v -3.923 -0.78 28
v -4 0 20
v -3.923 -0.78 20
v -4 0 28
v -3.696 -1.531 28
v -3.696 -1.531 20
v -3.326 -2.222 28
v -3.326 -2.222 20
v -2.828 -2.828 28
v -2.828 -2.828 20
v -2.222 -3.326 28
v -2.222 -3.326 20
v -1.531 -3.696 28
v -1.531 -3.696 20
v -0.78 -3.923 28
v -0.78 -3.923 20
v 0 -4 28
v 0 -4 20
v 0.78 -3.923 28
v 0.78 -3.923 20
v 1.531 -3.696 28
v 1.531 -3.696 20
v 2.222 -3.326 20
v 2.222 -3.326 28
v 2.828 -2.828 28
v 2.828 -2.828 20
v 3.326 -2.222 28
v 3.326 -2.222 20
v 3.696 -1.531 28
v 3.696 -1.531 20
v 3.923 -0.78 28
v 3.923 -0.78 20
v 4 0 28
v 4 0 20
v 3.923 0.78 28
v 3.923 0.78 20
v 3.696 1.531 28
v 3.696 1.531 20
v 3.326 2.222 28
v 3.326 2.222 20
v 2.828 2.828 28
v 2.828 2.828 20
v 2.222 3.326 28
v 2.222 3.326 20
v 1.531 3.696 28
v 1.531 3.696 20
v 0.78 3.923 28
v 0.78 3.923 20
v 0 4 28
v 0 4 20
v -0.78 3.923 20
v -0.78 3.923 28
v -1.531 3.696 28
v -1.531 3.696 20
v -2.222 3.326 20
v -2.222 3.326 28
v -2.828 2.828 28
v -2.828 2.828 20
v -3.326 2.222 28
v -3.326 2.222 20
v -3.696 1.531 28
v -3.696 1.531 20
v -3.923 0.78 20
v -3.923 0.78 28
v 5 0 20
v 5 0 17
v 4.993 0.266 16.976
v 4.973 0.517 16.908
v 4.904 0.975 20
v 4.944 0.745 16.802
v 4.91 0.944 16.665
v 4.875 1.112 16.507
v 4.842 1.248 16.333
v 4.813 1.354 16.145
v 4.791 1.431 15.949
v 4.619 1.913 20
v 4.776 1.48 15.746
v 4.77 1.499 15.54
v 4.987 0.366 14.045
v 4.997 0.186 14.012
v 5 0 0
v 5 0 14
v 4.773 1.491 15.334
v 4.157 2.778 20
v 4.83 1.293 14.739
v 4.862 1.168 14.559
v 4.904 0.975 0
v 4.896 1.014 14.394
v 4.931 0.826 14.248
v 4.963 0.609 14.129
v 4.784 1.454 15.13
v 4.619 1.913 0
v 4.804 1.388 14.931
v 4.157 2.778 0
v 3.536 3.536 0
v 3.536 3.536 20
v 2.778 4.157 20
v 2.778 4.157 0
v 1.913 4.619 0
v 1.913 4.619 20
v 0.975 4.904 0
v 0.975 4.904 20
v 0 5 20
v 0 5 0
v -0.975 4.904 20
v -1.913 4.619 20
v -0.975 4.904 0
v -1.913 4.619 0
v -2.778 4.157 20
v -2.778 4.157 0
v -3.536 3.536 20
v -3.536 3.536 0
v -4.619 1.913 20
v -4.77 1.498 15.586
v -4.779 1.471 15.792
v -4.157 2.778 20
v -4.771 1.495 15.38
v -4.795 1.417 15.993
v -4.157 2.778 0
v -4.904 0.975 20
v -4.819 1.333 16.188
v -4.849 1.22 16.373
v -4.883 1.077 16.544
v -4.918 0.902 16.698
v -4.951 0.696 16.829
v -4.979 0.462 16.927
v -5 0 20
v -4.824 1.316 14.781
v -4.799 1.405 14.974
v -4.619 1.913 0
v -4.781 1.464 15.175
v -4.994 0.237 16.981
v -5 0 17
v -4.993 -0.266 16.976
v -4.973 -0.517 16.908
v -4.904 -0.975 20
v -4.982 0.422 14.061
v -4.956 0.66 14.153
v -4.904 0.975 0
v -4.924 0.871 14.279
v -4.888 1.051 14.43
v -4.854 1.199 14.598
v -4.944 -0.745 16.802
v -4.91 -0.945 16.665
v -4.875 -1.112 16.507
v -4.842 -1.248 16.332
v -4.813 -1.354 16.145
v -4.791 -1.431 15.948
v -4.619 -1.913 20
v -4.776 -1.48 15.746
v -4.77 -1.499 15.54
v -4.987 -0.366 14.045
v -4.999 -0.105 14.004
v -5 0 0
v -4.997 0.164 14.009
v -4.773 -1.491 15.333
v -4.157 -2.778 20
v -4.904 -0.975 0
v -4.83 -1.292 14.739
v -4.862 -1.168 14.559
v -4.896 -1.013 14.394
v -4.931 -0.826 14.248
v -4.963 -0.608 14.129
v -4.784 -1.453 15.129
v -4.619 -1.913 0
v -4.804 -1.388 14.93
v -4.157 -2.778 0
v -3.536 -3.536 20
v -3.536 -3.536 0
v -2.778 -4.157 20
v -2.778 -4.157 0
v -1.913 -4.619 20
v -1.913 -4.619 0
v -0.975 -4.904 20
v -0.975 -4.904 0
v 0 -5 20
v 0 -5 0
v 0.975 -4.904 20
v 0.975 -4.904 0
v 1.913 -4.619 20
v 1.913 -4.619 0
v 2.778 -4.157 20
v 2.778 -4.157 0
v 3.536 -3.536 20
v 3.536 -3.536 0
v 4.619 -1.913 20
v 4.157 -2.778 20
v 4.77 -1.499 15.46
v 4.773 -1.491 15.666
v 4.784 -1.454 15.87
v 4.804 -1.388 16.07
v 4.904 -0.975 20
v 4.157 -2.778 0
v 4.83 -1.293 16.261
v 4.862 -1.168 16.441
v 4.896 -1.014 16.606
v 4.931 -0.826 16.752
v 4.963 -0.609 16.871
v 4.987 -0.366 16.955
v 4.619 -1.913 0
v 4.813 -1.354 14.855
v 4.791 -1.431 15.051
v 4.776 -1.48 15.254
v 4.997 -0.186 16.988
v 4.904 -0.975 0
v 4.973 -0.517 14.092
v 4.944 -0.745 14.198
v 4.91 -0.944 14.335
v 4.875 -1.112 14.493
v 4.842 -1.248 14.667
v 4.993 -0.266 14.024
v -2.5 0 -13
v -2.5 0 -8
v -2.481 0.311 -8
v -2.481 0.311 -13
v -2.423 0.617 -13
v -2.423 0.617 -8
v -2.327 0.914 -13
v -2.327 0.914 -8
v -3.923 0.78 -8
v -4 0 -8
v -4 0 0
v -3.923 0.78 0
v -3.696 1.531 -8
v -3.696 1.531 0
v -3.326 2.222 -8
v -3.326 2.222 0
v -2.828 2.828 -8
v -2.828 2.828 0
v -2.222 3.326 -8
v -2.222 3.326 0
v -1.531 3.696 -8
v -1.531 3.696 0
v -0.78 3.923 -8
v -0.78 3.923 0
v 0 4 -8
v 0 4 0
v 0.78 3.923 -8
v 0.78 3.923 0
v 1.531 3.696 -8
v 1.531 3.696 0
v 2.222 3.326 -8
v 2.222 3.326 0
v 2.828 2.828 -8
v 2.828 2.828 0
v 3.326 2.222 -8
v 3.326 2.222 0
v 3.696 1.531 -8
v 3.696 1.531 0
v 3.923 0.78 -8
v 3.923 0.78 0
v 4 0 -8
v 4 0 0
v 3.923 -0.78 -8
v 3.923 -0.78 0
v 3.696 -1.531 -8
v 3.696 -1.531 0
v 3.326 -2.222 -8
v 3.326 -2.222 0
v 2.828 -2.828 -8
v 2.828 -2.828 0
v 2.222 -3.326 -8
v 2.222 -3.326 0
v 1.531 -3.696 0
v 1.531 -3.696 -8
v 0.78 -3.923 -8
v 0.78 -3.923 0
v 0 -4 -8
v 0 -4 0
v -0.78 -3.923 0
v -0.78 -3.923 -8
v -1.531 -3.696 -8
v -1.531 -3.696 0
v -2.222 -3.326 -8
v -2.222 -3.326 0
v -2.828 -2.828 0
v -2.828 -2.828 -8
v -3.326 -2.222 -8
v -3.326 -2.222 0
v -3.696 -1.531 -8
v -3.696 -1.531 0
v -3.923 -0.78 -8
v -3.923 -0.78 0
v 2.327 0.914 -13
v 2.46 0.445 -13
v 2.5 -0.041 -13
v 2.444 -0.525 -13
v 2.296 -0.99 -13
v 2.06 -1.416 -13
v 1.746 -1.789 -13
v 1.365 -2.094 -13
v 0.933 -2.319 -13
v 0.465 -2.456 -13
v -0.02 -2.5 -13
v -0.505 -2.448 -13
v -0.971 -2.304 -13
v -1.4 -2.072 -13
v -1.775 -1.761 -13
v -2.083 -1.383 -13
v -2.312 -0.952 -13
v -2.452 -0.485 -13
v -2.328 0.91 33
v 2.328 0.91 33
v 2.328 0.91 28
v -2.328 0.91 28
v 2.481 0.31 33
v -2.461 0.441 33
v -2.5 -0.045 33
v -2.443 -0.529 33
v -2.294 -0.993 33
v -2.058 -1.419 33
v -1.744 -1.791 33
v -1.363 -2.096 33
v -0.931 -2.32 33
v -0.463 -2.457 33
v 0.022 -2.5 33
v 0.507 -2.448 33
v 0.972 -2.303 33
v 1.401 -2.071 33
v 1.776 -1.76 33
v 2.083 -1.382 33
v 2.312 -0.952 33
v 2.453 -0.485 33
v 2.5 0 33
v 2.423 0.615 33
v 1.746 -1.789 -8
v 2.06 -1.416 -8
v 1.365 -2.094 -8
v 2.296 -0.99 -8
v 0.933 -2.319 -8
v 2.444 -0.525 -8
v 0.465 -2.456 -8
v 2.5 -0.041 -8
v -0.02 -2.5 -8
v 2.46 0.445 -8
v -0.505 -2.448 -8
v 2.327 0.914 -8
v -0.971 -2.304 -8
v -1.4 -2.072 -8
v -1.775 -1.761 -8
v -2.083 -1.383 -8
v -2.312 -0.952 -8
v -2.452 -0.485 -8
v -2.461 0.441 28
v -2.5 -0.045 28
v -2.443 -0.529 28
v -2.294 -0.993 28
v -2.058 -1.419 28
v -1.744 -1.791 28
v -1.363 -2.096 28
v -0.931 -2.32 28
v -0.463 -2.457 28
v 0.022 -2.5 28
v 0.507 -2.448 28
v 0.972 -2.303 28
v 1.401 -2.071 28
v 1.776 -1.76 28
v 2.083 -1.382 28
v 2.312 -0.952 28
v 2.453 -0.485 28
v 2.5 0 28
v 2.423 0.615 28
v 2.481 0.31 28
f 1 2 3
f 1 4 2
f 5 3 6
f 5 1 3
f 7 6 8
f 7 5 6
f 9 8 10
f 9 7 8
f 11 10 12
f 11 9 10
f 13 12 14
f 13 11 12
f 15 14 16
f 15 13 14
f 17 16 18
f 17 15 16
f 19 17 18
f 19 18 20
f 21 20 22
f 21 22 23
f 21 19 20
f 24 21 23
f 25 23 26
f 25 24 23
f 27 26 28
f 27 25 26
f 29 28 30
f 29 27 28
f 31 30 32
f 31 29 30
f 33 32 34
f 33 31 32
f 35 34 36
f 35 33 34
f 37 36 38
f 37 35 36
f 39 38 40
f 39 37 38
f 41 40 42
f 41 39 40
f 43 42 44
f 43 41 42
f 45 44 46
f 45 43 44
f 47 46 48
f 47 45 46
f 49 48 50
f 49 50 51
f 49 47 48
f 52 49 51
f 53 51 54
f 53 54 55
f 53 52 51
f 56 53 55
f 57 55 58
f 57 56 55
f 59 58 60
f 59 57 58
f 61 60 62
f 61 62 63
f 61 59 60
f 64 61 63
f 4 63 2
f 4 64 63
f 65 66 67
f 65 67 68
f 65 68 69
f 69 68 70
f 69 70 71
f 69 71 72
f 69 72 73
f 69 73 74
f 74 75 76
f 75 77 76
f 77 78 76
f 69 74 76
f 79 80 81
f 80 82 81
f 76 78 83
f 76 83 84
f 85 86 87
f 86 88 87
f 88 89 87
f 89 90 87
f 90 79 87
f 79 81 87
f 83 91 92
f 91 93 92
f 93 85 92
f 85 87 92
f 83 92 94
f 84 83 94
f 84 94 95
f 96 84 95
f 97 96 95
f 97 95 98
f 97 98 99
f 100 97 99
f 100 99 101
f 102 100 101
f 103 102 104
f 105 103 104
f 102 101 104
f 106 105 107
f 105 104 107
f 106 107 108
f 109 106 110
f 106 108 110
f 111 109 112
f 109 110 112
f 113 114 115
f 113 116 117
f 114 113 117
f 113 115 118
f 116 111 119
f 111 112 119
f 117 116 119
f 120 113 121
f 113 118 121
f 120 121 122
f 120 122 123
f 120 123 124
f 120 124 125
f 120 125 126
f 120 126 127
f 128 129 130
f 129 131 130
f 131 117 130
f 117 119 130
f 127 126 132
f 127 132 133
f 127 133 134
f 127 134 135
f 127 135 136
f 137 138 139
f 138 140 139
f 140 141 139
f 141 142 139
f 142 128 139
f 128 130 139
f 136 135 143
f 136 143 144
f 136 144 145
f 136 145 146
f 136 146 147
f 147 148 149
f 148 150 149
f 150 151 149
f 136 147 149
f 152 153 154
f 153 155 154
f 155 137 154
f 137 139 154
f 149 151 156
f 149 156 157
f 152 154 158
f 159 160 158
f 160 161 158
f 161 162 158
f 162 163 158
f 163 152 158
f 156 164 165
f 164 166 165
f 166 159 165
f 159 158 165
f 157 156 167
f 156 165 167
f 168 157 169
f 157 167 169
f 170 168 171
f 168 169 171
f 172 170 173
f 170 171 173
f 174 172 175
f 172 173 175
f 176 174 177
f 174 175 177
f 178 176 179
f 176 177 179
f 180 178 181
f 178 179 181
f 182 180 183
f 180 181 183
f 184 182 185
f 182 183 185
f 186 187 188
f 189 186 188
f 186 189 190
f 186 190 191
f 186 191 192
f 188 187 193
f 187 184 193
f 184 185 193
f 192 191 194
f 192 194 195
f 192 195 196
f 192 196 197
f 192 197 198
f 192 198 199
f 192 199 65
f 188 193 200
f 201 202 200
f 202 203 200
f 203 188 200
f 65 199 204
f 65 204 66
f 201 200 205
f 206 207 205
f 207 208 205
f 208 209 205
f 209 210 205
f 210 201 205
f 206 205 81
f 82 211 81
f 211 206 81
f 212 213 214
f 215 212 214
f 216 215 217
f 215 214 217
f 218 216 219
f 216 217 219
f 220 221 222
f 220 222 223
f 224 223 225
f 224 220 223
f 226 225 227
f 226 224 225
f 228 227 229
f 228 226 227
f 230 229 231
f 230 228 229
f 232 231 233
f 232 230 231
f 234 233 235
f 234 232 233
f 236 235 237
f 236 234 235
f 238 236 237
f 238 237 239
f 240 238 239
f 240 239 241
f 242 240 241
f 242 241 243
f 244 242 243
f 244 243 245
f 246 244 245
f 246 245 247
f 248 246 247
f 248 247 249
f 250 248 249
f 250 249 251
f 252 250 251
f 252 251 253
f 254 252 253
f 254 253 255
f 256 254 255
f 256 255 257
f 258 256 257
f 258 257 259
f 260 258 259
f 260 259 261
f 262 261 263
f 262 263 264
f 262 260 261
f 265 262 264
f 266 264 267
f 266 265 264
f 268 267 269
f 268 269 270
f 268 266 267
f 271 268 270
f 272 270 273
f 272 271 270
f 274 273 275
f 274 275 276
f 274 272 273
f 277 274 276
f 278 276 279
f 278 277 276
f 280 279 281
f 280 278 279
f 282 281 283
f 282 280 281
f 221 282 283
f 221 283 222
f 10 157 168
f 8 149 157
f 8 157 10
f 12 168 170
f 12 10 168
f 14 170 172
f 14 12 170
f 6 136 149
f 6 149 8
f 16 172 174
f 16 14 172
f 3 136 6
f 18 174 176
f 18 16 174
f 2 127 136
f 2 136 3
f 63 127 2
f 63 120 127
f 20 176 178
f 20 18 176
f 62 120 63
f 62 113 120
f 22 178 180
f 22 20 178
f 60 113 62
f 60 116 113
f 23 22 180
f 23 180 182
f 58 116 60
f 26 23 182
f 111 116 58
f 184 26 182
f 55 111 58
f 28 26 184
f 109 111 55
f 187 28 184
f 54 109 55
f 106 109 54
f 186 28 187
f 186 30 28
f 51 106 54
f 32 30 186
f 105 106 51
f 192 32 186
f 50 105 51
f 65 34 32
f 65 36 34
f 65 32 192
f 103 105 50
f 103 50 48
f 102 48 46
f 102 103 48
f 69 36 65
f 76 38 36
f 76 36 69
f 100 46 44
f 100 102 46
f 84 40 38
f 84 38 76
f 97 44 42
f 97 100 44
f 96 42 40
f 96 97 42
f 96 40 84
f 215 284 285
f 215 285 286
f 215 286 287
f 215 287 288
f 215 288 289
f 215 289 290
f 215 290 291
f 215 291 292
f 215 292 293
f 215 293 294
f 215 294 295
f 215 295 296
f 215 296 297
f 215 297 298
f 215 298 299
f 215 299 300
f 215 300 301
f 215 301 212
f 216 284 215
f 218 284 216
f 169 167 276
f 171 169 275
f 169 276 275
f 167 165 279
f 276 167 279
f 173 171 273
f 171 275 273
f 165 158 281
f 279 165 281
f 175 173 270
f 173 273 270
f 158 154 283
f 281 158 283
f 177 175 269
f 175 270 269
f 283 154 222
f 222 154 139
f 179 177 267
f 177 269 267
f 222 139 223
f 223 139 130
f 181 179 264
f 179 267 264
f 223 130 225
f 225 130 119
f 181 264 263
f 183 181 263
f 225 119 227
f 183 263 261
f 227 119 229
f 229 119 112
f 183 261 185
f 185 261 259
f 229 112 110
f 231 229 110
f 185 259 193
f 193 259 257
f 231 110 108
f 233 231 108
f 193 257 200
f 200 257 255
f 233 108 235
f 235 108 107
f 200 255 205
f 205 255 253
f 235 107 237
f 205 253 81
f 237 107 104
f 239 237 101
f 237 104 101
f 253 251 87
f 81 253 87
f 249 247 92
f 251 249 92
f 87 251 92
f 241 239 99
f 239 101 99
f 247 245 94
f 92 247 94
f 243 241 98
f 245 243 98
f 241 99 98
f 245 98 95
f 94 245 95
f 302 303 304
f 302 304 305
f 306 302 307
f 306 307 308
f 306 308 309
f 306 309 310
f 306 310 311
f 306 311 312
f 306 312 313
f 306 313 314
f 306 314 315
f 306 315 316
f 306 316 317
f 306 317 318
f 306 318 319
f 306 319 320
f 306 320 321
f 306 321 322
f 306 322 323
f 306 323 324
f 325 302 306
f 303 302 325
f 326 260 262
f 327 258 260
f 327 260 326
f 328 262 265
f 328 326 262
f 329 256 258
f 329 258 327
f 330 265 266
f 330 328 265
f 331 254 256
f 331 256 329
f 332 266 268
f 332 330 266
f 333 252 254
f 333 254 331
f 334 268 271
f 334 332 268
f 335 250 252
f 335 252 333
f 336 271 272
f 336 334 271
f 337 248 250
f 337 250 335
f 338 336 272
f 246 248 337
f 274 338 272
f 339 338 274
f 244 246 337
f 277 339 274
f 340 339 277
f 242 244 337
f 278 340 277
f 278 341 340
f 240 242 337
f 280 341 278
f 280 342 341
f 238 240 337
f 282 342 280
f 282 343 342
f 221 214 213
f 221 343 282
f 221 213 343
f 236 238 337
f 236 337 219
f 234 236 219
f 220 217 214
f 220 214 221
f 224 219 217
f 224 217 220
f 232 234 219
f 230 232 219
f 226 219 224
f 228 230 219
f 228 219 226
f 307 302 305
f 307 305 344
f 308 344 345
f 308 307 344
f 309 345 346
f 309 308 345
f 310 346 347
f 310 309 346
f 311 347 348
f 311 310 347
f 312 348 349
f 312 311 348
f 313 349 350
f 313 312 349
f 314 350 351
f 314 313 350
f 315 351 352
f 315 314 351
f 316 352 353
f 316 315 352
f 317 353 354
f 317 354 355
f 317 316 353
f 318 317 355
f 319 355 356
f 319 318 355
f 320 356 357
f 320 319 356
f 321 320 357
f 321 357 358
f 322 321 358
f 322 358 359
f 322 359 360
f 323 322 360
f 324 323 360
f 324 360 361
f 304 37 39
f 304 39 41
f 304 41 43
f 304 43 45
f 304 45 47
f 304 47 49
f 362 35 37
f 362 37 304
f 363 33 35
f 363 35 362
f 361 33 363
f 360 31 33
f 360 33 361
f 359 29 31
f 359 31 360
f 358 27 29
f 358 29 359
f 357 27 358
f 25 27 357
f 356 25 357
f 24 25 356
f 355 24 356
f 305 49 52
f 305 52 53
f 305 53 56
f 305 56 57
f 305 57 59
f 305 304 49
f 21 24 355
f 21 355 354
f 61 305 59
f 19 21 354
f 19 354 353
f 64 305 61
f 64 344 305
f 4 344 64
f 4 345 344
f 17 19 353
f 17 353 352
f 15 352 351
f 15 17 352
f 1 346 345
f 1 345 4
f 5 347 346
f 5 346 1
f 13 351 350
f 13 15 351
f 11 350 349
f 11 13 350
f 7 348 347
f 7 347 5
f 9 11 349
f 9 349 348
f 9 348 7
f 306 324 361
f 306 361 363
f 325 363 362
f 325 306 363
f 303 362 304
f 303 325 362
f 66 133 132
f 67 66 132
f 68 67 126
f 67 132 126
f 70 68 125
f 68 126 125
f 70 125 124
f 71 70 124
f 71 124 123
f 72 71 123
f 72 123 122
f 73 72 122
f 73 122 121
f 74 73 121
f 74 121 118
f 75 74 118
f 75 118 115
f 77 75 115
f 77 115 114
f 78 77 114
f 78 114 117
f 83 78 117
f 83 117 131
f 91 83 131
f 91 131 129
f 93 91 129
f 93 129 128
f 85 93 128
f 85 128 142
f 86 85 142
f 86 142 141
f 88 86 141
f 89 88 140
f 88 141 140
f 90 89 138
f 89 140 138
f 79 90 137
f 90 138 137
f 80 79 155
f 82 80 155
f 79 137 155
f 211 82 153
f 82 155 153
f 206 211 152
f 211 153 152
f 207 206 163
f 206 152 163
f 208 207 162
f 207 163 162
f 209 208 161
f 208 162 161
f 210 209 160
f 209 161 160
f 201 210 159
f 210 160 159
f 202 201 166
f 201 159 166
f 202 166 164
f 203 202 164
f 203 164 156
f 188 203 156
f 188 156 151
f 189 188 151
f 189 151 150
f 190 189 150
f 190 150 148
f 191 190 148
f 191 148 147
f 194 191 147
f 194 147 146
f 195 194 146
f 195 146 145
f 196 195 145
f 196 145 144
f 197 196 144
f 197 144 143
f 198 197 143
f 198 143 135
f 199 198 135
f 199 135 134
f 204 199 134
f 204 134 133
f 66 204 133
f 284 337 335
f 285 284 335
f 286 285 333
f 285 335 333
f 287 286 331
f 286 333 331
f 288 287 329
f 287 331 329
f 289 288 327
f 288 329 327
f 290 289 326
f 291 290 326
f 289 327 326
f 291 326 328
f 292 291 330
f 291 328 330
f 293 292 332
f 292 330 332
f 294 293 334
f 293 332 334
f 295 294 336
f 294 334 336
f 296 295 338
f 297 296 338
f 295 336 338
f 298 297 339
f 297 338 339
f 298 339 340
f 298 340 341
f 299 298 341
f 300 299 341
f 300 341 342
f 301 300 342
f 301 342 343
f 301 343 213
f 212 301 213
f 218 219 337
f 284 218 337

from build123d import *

# Parameters (mm, degrees)
SKETCH1_R           = 5
BOSS_EXTRUDE1_DEPTH = 20
SKETCH2_R           = 3.5
BOSS_EXTRUDE2_DEPTH = 8
BOSS_EXTRUDE3_START = 8
SKETCH3_R           = 3.5
BOSS_EXTRUDE3_DEPTH = 8
BOSS_EXTRUDE4_DEPTH = 5
BOSS_EXTRUDE5_START = 5
BOSS_EXTRUDE5_DEPTH = 5
SKETCH7_R           = 1.5
CUT_EXTRUDE1_DEPTH  = 15
BOSS_EXTRUDE6_REACH = 43.605
SKETCH8_R           = 4
BOSS_EXTRUDE7_REACH = 43.605
SKETCH9_R           = 4


with BuildPart() as part:
    # Sketch1 → Boss-Extrude1 (new body)
    with BuildSketch(Plane.XY):
        Circle(SKETCH1_R)
    extrude(amount=BOSS_EXTRUDE1_DEPTH)

    # Sketch2 → Boss-Extrude2 (add)
    with BuildSketch(Plane.XY.offset(20)):
        Circle(SKETCH2_R)
    extrude(amount=BOSS_EXTRUDE2_DEPTH)

    # Sketch3 → Boss-Extrude3 (add)
    with BuildSketch(Plane(origin=(0, 0, 0), x_dir=(-1, 0, 0), z_dir=(0, 0, -1)).offset(BOSS_EXTRUDE3_START)):
        with Locations(Location((0, 0, 0), (0, 0, 180))):
            Circle(SKETCH3_R)
    extrude(amount=-BOSS_EXTRUDE3_DEPTH)

    # Sketch4 → Boss-Extrude4 (add)
    with BuildSketch(Plane(origin=(0, 0, -8), x_dir=(-1, 0, 0), z_dir=(0, 0, -1))):
        with BuildLine():
            Line((2.326935409, 0.913986654), (-2.326935409, 0.913986654))
            ThreePointArc((-2.326935409, 0.913986654), (-0.465113684, -2.456352837), (2.5, 0))
            ThreePointArc((2.5, 0), (2.456352837, 0.465113684), (2.326935409, 0.913986654))
        make_face()
    extrude(amount=BOSS_EXTRUDE4_DEPTH)

    # Sketch6 → Boss-Extrude5 (add)
    with BuildSketch(Plane.XY.offset(28).offset(BOSS_EXTRUDE5_START)):
        with BuildLine():
            Line((2.32849737, 0.91), (-2.32849737, 0.91))
            ThreePointArc((-2.32849737, 0.91), (-0.46301003, -2.456750234), (2.5, 0))
            ThreePointArc((2.5, 0), (2.456750234, 0.46301003), (2.32849737, 0.91))
        make_face()
    extrude(amount=-BOSS_EXTRUDE5_DEPTH)

    # Sketch7 → Cut-Extrude1 (cut)
    with BuildSketch(Plane.ZY.offset(5)):
        with Locations((15.5, 0)):
            Circle(SKETCH7_R)
    extrude(amount=-CUT_EXTRUDE1_DEPTH, mode=Mode.SUBTRACT)

    # Sketch8 → Boss-Extrude6 (add, up to next)
    with BuildSketch(Plane(origin=(0, 0, -8), x_dir=(-1, 0, 0), z_dir=(0, 0, -1)), mode=Mode.PRIVATE) as boss_extrude6_sk1:
        Circle(SKETCH8_R)
    boss_extrude6_tool1 = extrude(boss_extrude6_sk1.sketch, amount=-BOSS_EXTRUDE6_REACH, mode=Mode.PRIVATE) - part.part
    add(boss_extrude6_tool1.solids().sort_by_distance((0, 0, -8))[0])

    # Sketch9 → Boss-Extrude7 (add, up to next)
    with BuildSketch(Plane.XY.offset(28), mode=Mode.PRIVATE) as boss_extrude7_sk1:
        with Locations(Location((0, 0, 0), (0, 0, 180))):
            Circle(SKETCH9_R)
    boss_extrude7_tool1 = extrude(boss_extrude7_sk1.sketch, amount=-BOSS_EXTRUDE7_REACH, mode=Mode.PRIVATE) - part.part
    add(boss_extrude7_tool1.solids().sort_by_distance((0, 0, 28))[0])


solid = part.part
